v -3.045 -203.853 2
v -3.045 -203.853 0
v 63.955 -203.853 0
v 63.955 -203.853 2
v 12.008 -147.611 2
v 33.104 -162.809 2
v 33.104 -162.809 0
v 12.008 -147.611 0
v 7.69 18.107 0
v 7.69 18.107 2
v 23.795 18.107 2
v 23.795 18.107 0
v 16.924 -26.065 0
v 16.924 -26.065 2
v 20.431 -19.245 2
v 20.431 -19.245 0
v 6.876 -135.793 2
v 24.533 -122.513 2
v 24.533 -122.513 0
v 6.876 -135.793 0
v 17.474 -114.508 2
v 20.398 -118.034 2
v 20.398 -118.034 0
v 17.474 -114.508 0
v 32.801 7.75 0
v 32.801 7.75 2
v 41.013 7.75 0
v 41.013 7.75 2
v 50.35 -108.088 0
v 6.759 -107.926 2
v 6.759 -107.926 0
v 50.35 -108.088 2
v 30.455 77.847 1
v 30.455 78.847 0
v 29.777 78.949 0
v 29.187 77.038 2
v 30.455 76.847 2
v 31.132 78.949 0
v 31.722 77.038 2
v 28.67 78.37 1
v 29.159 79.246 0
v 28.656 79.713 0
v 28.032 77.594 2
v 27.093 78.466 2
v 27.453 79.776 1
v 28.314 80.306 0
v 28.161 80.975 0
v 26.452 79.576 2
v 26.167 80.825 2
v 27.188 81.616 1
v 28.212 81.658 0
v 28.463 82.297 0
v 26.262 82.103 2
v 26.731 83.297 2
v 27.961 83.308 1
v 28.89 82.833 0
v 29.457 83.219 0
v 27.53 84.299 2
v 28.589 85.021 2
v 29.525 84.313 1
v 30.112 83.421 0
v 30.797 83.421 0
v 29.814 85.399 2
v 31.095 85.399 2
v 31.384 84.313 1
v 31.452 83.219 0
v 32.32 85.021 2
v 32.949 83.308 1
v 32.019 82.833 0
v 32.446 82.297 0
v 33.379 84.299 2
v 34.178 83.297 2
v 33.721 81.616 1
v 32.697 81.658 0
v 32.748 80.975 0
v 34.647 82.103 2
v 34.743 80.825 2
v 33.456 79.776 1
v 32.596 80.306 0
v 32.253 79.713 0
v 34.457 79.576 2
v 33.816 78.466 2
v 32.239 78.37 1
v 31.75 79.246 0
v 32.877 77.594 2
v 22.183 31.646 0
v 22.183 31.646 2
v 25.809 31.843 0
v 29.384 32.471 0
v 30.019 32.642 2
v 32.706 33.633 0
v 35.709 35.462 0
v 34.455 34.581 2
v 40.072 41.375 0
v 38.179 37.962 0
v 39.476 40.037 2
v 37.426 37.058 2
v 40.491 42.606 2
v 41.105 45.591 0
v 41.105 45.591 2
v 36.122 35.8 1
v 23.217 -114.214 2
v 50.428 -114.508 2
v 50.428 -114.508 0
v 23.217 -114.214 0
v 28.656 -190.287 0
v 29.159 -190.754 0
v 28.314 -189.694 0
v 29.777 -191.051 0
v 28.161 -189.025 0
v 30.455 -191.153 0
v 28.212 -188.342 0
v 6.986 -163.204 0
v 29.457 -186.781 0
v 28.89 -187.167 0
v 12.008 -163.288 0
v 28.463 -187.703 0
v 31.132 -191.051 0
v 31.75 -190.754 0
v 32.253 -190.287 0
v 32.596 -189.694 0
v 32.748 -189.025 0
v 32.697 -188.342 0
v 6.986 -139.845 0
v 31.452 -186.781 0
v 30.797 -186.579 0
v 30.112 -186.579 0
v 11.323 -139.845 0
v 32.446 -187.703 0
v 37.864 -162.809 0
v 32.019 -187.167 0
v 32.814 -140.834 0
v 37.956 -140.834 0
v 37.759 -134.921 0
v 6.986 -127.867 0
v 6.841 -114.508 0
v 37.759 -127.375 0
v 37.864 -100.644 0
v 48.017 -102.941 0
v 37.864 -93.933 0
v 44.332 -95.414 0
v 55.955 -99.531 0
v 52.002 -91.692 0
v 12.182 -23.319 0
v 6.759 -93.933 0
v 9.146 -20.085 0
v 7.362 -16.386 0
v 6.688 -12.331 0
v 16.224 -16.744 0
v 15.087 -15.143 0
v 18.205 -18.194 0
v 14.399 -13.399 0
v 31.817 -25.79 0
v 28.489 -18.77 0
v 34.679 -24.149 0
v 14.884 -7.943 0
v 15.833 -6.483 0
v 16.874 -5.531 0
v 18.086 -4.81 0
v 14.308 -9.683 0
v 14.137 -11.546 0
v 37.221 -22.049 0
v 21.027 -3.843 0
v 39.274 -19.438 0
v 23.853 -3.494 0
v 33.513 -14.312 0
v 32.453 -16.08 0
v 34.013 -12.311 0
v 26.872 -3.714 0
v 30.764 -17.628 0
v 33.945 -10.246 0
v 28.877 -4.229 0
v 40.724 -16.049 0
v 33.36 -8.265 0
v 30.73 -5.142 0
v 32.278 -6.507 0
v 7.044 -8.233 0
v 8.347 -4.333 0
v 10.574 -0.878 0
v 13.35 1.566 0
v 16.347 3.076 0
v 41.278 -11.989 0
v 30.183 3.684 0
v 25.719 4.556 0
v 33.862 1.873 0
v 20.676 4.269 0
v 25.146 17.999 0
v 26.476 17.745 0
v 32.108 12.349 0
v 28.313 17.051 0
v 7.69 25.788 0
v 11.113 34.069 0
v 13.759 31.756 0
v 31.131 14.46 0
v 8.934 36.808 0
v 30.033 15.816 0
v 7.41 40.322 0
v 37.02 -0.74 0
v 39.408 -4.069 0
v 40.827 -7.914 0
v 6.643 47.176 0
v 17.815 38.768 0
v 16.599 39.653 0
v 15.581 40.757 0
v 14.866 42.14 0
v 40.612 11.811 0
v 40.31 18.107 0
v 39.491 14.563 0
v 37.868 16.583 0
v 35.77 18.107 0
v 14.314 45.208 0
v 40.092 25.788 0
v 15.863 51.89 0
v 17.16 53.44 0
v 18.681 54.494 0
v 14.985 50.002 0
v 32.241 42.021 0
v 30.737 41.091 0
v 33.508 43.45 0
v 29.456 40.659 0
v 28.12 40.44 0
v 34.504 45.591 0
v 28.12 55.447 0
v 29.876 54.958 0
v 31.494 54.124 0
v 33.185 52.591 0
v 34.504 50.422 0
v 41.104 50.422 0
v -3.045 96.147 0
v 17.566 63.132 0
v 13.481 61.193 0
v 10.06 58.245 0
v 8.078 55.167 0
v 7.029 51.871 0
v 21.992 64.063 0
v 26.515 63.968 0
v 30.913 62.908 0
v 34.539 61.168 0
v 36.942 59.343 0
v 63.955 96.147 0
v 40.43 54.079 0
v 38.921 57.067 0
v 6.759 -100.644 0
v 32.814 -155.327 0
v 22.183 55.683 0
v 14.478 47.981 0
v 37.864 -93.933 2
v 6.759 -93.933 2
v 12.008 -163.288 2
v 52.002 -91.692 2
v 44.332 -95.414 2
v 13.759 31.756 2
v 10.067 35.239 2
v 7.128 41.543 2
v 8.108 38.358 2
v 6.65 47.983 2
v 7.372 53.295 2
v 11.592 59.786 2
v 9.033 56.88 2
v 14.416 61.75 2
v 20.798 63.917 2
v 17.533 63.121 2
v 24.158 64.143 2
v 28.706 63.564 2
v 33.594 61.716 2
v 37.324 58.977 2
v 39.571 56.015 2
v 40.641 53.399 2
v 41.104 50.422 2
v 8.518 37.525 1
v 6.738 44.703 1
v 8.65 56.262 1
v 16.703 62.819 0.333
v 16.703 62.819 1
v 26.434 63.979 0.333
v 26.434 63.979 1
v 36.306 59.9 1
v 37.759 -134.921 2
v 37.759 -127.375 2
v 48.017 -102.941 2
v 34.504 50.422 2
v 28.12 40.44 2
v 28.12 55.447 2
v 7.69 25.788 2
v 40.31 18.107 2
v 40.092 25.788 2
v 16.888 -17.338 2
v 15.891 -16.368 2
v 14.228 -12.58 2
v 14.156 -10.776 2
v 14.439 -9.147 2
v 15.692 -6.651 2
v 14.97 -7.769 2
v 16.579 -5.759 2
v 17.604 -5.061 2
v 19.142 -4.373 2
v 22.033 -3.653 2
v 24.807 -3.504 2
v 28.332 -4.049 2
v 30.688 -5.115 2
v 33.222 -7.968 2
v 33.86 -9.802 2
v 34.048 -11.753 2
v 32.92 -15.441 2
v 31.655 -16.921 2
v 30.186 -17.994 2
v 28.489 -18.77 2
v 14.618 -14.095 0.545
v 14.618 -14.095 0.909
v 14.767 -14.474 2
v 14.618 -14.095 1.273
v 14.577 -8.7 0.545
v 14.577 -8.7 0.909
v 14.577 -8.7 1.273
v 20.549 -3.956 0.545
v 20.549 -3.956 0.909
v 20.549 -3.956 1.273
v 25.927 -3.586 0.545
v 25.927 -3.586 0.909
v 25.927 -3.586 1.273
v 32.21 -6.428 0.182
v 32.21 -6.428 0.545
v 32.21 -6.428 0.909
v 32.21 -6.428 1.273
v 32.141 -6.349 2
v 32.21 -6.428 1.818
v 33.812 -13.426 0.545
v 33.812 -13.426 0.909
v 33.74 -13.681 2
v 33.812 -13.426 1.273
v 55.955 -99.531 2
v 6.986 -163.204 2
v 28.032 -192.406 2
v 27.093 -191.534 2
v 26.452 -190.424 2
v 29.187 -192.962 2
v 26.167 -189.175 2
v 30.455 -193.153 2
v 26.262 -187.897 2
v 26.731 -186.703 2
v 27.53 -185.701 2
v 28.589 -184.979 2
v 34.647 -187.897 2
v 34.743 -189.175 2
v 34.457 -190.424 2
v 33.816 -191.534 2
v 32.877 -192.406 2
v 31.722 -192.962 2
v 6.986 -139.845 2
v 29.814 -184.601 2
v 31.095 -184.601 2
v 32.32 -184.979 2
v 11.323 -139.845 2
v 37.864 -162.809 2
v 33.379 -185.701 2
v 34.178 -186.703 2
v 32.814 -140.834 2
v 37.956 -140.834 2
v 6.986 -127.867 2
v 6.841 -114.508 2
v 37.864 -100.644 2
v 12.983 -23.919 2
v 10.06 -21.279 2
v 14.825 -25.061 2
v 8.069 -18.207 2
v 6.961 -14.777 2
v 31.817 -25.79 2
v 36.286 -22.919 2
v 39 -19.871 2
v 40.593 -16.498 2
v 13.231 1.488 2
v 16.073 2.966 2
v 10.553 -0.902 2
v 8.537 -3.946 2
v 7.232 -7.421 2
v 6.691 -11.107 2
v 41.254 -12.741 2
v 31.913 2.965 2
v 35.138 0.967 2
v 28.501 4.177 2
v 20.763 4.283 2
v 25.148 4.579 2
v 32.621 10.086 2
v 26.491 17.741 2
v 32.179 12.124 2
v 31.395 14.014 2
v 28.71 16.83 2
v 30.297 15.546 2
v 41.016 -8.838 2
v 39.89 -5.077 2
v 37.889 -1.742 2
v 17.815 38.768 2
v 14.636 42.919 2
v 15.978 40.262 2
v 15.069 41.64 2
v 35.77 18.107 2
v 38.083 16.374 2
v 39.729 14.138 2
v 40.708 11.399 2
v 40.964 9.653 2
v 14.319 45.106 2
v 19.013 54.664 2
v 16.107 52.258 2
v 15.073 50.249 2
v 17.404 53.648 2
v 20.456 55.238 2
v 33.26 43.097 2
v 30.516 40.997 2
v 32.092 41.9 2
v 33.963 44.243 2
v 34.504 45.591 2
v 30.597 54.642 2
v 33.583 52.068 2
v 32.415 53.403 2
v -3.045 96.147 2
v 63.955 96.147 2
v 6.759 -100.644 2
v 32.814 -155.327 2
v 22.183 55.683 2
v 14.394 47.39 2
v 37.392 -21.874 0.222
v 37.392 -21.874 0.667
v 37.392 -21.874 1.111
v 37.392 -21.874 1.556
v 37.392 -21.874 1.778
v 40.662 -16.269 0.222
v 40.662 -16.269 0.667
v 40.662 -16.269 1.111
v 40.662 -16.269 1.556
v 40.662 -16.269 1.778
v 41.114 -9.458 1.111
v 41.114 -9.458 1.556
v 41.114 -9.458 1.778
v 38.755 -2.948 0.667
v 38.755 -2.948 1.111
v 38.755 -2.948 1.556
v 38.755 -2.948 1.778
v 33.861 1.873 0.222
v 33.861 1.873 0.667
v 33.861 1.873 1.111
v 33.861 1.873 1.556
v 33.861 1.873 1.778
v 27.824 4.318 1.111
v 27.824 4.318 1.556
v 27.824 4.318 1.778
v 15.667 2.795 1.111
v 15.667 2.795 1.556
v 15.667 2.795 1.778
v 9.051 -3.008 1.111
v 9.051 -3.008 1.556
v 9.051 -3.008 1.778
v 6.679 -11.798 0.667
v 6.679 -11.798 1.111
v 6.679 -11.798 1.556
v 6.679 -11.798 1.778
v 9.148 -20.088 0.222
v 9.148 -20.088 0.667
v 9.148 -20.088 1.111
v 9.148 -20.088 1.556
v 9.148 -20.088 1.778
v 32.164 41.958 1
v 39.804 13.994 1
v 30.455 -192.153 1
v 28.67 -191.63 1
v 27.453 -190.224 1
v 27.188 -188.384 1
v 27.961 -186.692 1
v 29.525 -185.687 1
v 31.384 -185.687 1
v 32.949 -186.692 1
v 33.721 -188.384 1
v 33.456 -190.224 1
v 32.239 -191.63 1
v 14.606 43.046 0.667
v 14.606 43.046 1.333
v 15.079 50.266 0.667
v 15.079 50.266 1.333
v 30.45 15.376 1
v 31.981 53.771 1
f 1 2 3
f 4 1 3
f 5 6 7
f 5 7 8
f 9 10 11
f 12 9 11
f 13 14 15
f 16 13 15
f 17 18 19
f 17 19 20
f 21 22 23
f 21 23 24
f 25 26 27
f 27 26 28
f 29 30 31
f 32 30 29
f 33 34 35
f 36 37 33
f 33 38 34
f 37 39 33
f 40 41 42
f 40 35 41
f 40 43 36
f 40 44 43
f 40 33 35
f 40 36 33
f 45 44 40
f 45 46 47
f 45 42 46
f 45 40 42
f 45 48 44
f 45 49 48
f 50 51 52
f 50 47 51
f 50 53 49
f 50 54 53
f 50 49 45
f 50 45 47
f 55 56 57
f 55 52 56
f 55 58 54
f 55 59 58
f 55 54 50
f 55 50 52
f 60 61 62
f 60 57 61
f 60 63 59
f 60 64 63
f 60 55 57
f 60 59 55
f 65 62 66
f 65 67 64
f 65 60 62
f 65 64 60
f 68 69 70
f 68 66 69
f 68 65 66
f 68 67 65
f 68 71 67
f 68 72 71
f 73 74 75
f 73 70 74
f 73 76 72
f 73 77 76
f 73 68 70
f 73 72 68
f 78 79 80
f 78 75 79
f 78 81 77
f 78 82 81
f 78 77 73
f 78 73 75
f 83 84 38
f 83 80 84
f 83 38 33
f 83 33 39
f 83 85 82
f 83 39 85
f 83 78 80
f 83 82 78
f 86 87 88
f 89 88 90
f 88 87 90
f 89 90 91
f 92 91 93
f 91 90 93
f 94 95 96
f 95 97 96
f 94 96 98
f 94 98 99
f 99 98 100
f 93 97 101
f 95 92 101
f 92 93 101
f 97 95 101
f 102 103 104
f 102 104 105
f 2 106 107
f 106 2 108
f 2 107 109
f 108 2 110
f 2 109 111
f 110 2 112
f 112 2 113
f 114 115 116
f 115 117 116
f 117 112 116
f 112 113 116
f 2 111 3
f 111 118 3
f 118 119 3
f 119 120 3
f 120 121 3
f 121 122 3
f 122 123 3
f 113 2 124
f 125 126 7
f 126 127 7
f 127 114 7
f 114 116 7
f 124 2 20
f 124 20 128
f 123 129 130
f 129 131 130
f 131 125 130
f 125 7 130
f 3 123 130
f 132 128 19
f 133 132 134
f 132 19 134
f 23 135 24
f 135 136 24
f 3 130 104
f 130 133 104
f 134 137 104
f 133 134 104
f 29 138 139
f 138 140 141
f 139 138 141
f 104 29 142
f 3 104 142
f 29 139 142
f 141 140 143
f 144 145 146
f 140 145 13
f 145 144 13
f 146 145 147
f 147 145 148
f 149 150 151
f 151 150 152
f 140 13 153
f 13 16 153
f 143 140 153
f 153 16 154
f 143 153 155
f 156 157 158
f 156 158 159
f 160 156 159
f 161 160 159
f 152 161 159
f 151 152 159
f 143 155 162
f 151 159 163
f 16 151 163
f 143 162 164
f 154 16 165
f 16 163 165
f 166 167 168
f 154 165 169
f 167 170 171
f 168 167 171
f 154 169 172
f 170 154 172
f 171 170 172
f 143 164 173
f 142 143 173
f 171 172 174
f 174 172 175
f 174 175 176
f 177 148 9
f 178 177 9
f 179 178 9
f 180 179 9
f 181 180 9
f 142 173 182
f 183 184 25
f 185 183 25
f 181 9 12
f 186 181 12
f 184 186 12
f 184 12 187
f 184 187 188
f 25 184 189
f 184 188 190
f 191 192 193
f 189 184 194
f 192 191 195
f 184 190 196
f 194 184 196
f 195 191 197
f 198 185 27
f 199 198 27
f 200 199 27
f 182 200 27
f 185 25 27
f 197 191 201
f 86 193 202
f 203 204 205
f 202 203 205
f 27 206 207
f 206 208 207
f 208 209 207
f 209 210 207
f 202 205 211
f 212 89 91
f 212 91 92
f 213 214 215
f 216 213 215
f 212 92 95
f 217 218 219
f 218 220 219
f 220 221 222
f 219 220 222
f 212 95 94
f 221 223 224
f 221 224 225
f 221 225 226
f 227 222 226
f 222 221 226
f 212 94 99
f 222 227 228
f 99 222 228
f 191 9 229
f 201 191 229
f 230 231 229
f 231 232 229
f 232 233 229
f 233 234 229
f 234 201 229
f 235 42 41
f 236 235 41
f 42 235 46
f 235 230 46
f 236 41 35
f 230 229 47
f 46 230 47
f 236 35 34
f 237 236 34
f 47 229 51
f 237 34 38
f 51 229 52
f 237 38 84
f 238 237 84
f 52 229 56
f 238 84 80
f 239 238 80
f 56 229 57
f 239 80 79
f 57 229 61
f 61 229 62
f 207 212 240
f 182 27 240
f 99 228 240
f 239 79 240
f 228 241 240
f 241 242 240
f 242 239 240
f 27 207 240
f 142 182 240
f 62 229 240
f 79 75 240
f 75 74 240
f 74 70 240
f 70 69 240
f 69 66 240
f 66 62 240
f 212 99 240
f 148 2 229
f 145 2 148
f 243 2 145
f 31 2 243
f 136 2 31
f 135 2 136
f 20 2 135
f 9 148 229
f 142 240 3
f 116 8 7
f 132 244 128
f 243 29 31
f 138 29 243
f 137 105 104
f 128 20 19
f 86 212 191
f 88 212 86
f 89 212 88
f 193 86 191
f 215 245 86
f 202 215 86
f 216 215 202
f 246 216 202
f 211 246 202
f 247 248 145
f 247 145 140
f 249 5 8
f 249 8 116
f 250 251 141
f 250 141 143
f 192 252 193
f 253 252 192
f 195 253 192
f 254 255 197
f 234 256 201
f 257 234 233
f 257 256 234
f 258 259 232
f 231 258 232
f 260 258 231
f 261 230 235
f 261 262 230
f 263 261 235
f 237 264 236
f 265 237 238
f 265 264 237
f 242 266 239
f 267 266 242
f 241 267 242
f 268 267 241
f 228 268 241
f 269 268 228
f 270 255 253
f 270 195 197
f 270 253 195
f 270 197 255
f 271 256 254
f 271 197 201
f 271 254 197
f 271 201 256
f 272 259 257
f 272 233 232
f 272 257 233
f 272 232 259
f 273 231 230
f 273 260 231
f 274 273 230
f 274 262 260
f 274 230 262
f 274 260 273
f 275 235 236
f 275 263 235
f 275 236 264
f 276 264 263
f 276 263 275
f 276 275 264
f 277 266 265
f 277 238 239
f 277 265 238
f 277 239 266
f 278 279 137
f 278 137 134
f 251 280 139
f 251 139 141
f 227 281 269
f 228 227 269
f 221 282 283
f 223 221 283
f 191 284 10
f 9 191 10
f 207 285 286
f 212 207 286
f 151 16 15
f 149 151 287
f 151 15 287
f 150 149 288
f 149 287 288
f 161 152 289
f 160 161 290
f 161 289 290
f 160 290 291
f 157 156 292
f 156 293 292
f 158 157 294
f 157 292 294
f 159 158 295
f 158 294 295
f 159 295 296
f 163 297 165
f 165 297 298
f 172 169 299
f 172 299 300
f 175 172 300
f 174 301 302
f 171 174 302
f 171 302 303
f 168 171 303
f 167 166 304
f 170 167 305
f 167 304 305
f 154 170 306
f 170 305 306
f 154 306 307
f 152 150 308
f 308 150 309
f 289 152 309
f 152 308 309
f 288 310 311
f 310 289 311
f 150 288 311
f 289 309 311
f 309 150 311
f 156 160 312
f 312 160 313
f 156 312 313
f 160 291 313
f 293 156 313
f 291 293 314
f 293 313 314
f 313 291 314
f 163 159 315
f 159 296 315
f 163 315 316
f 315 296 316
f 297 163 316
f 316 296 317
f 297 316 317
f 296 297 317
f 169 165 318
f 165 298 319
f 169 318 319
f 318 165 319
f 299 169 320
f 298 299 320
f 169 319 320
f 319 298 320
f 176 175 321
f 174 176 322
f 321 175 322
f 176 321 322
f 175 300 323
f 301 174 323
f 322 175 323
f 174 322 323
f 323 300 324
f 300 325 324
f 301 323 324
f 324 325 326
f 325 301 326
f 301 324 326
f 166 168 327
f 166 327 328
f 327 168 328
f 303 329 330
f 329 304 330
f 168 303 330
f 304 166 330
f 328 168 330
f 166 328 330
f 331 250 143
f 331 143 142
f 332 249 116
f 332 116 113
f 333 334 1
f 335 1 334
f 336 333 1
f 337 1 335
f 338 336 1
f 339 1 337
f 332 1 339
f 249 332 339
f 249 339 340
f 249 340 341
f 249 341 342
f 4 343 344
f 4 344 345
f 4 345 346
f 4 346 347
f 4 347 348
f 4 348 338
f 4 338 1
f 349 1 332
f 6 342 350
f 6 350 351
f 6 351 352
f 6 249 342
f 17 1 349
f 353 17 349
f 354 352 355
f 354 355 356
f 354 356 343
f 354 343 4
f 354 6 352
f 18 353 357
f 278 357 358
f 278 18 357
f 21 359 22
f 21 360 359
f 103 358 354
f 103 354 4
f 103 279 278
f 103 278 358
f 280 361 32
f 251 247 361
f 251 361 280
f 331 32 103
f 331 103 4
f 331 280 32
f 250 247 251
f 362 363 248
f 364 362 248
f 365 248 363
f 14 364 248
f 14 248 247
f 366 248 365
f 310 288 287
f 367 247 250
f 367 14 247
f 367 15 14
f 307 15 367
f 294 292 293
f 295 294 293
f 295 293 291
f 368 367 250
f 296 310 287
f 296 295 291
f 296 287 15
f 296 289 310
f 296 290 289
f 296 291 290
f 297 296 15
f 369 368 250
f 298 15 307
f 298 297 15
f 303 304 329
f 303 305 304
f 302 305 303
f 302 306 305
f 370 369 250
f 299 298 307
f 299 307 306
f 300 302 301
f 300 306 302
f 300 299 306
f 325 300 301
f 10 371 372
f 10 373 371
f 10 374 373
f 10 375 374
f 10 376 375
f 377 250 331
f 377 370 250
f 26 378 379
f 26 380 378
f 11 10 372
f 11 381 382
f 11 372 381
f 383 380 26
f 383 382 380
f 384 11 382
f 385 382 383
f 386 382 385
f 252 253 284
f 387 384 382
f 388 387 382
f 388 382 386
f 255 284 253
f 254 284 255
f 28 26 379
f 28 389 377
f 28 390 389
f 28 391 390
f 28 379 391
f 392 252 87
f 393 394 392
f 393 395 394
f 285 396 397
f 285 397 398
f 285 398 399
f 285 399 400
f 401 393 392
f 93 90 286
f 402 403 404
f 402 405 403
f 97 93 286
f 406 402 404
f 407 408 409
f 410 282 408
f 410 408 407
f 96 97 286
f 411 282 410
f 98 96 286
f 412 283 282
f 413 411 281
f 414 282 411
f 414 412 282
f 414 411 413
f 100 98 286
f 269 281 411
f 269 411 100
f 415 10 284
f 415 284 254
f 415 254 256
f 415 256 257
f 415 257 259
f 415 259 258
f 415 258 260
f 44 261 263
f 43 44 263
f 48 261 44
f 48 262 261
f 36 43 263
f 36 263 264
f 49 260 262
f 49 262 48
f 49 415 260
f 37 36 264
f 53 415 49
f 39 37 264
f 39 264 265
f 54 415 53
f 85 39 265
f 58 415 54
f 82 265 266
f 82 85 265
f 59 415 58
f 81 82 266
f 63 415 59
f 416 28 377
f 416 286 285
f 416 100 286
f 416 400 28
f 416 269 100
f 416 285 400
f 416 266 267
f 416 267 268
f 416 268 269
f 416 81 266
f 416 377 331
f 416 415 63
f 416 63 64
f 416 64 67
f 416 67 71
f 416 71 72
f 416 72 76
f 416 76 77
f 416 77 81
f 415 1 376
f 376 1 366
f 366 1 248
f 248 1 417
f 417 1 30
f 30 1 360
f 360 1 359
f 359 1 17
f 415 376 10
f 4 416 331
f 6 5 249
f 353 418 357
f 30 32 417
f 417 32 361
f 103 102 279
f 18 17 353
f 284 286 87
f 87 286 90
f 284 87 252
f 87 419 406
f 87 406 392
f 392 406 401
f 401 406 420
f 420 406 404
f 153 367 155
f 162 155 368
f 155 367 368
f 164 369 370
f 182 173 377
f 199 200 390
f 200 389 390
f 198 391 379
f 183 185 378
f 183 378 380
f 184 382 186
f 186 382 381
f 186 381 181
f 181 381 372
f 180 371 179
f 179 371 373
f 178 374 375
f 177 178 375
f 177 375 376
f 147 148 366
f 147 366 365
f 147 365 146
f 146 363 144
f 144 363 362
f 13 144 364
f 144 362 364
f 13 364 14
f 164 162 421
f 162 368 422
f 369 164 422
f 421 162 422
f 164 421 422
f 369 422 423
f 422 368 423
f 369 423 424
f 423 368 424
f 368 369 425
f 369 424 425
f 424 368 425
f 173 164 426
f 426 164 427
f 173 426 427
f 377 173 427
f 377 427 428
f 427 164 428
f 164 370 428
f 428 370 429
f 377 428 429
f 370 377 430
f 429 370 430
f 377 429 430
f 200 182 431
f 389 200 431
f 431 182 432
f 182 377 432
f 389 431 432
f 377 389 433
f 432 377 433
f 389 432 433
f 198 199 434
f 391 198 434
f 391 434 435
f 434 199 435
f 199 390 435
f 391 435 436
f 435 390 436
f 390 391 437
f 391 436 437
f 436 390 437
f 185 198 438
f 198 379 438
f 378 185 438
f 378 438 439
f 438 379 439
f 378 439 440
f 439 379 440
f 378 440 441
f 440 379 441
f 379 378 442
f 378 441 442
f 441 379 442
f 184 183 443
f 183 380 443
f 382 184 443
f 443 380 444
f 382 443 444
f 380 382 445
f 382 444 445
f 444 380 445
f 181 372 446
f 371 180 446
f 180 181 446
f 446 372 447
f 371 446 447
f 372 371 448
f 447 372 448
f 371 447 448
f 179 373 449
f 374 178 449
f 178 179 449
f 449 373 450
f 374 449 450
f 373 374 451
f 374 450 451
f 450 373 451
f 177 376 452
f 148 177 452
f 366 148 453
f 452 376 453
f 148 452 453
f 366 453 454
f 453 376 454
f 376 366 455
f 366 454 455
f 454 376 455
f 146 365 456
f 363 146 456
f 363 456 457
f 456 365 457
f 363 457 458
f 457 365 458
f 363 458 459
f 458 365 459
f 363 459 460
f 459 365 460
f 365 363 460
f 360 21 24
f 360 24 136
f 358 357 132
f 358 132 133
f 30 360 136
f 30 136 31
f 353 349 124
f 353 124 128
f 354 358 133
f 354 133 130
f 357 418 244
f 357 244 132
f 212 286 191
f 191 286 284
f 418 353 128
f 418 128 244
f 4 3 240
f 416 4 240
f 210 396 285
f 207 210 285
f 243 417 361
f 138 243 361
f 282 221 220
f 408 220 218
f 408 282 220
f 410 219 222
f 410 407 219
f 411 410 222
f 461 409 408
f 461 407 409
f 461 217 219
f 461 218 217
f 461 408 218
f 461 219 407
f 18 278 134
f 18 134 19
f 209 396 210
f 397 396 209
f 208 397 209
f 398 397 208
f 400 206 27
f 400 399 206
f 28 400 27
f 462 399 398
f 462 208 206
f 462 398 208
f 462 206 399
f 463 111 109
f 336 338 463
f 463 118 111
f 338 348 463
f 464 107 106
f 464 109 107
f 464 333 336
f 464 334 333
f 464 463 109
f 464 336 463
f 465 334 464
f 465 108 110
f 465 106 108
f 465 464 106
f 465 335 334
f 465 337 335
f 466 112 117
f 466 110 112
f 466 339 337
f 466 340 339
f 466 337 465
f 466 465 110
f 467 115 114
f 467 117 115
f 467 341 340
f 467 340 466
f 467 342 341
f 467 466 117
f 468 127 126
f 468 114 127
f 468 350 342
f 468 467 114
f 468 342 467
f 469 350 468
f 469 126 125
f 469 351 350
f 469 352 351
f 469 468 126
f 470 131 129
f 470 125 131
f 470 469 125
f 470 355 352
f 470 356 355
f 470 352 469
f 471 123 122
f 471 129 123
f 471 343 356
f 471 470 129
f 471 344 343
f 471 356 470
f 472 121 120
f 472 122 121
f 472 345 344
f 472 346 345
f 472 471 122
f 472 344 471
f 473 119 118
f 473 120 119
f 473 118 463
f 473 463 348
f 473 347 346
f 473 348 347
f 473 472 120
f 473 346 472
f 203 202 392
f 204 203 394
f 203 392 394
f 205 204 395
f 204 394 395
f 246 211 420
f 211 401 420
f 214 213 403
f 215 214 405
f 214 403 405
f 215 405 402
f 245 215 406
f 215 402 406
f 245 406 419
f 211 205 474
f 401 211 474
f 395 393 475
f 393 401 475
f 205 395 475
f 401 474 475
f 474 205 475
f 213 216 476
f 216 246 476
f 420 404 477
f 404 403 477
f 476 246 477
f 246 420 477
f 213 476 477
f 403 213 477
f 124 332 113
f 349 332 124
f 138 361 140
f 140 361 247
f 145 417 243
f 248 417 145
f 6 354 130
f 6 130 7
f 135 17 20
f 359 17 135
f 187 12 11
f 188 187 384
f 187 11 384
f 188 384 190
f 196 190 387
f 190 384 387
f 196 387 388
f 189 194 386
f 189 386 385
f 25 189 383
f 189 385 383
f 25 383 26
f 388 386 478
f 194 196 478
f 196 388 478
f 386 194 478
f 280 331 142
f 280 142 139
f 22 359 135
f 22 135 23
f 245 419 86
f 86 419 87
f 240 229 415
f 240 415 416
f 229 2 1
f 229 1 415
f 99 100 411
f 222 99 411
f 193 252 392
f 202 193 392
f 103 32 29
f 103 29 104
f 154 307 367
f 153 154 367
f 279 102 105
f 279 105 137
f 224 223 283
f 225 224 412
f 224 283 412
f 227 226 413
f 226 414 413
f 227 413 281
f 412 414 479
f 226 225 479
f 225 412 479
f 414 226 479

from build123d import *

# Parameters (mm, degrees)
SKIZZE2_W                                   = 67
SKIZZE2_H                                   = 300
AUFSATZ_LINEAR_AUSTRAGEN1_DEPTH             = 2
FORMSENKUNG_F_R_M4_SENKSCHRAUBE_MIT_2_COUNT = 2
FORMSENKUNG_F_R_M4_SENKSCHRAUBE_MIT_2_PITCH = 270
SKIZZE9_W                                   = 31.10502621
SKIZZE9_H                                   = 6.710582317
SCHNITT_LINEAR_AUSTRAGEN5_DEPTH             = 10


with BuildPart() as part:
    # Skizze2 → Aufsatz-Linear austragen1 (new body)
    with BuildSketch(Plane.XY):
        with Locations((30.454545455, -53.853438228)):
            Rectangle(SKIZZE2_W, SKIZZE2_H)
    extrude(amount=AUFSATZ_LINEAR_AUSTRAGEN1_DEPTH)

    # Skizze4 → Formsenkung für M4 Senkschraube mit Innensechskant1 (revolve, cut)
    with BuildSketch(Plane(origin=(30.454545455, 81.146561772, 2), x_dir=(0, -1, 0), z_dir=(1, 0, 0))):
        Polygon((0, 0), (0, 2), (2.25, 2), (2.25, 2.05), (4.3, 0), align=None)
    formsenkung_f_r_m4_senkschraube_mit_inne = revolve(axis=Axis((30.454545455, 81.146561772, 8.35), (0, 0, -1)), mode=Mode.SUBTRACT)

    # Formsenkung f_r M4 Senkschraube mit  2: Formsenkung für M4 Senkschraube mit Innensechskant1 ×2
    with Locations(*[(0, -i * FORMSENKUNG_F_R_M4_SENKSCHRAUBE_MIT_2_PITCH, 0) for i in range(1, FORMSENKUNG_F_R_M4_SENKSCHRAUBE_MIT_2_COUNT)]):
        add(formsenkung_f_r_m4_senkschraube_mit_inne, mode=Mode.SUBTRACT)

    # Skizze9 → Schnitt-Linear austragen5 (cut)
    with BuildSketch(Plane.XY.offset(2)):
        Polygon((52.001558097, -91.692267967), (55.954864906, -99.53078632), (48.017183689, -102.940874601), (44.331709582, -95.41361182), align=None)
        with Locations((22.311332276, -97.288736457)):
            Rectangle(SKIZZE9_W, SKIZZE9_H)
        Polygon((6.758819171, -107.925887397), (50.350445865, -108.08808674), (50.427715289, -114.508189206), (23.217156686, -114.214287256), (37.758627479, -127.374767162), (37.758627479, -134.920795826), (24.5330538, -122.513026823), (6.876063428, -135.792670476), (6.986282299, -127.867340204), (20.398215233, -118.033810853), (17.474377356, -114.508189206), (6.841373177, -114.508189206), align=None)
        Polygon((32.81378197, -140.833783467), (37.956076493, -140.833783467), (37.863845381, -162.808656047), (33.104263457, -162.808656047), (12.007535601, -147.611290016), (12.007535601, -163.287666955), (6.986282299, -163.203737544), (6.986282299, -139.845285888), (11.322896284, -139.845285888), (32.81378197, -155.326589829), align=None)
        with BuildLine():
            Line((7.689666718, 25.787766367), (7.689666718, 18.106787224))
            Line((7.689666718, 18.106787224), (23.794942522, 18.106787224))
            add(Edge.make_bspline(
                [(23.794942522, 18.106787224), (32.601188558, 17.824016107), (32.801302406, 7.750150648)],
                knots=[0, 0, 0, 1, 1, 1], degree=2))
            Line((32.801302406, 7.750150648), (41.012907208, 7.750150648))
            add(Edge.make_bspline(
                [(35.769786279, 18.106787224), (41.216248983, 15.059838558), (41.012907208, 7.750150648)],
                knots=[0, 0, 0, 1, 1, 1], degree=2))
            Line((35.769786279, 18.106787224), (40.309969546, 18.106787224))
            Line((40.309969546, 18.106787224), (40.091631389, 25.787766367))
            Line((40.091631389, 25.787766367), (7.689666718, 25.787766367))
        make_face()
        with BuildLine():
            Line((28.488917876, -18.770250647), (31.817381195, -25.78965933))
            add(Edge.make_bspline(
                [(31.817381195, -25.78965933), (35.498176655, -24.019055478), (42.40530325, -18.074227702), (41.213657778, -2.009478612), (30.919016285, 4.141303213), (22.776211659, 4.831375661), (17.572864113, 3.89204048), (9.441685379, -0.413341636), (6.135963941, -7.921355494), (7.32226522, -18.888063748), (11.205018419, -23.673518651), (16.923657697, -26.06530754)],
                knots=[0, 0, 0, 0, 0.119409873, 0.27925359, 0.419931345, 0.450283778, 0.568056354, 0.605462622, 0.786940191, 0.828662398, 1, 1, 1, 1], degree=3))
            Line((16.923657697, -26.06530754), (20.431478316, -19.245299659))
            add(Edge.make_bspline(
                [(20.431478316, -19.245299659), (18.529961715, -18.448815365), (16.619467923, -17.425214119), (13.813302006, -13.511550753), (14.121204554, -6.483932431), (18.310146069, -4.418568869), (22.673204949, -3.485417269), (24.799039205, -3.418559428), (28.73741634, -3.960815369), (33.231832404, -6.011813728), (34.58703032, -11.56981876), (32.747718821, -16.344485846), (30.562040823, -18.053193176), (28.488917876, -18.770250647)],
                knots=[0, 0, 0, 0, 0.057281263, 0.077975222, 0.206939595, 0.4121179, 0.446671031, 0.540715366, 0.566135351, 0.689115335, 0.842004928, 0.873093394, 1, 1, 1, 1], degree=3))
        make_face()
        with BuildLine():
            Line((22.182559591, 55.683464558), (22.182559591, 31.646286217))
            add(Edge.make_bspline(
                [(22.182559591, 31.646286217), (28.285199554, 31.688242642), (36.493541258, 34.092996652), (40.550526158, 41.167443579), (41.105027709, 45.591258556)],
                knots=[0, 0, 0, 0, 0.555389856, 1, 1, 1, 1], degree=3))
            Line((41.105027709, 45.591258556), (34.50379781, 45.591258556))
            add(Edge.make_bspline(
                [(28.120055334, 40.440191437), (33.016316255, 40.899947408), (34.50379781, 45.591258556)],
                knots=[0, 0, 0, 1, 1, 1], degree=2))
            Line((28.120055334, 40.440191437), (28.120055334, 55.446553709))
            add(Edge.make_bspline(
                [(28.120055334, 55.446553709), (32.650059687, 54.608093435), (34.50379781, 50.422414638)],
                knots=[0, 0, 0, 1, 1, 1], degree=2))
            Line((34.50379781, 50.422414638), (41.104275737, 50.422414638))
            add(Edge.make_bspline(
                [(13.75926765, 31.756110501), (12.069853486, 33.007836098), (8.027031384, 37.003253409), (6.523132286, 43.013028309), (6.628333317, 56.311278281), (15.261430342, 63.498214031), (30.12062724, 65.215358583), (40.774477596, 58.523780449), (41.104275737, 50.422414638)],
                knots=[0, 0, 0, 0, 0.09000754, 0.234551371, 0.339423329, 0.540898393, 0.687756002, 1, 1, 1, 1], degree=3))
            Line((13.75926765, 31.756110501), (17.814541142, 38.76818417))
            add(Edge.make_bspline(
                [(17.814541142, 38.76818417), (15.599033207, 40.145840228), (13.917486025, 43.782276328), (14.533611479, 51.295203557), (17.892855837, 54.819575464), (22.182559591, 55.683464558)],
                knots=[0, 0, 0, 0, 0.22087745, 0.573734075, 1, 1, 1, 1], degree=3))
        make_face()
    extrude(amount=-SCHNITT_LINEAR_AUSTRAGEN5_DEPTH, mode=Mode.SUBTRACT)


solid = part.part
